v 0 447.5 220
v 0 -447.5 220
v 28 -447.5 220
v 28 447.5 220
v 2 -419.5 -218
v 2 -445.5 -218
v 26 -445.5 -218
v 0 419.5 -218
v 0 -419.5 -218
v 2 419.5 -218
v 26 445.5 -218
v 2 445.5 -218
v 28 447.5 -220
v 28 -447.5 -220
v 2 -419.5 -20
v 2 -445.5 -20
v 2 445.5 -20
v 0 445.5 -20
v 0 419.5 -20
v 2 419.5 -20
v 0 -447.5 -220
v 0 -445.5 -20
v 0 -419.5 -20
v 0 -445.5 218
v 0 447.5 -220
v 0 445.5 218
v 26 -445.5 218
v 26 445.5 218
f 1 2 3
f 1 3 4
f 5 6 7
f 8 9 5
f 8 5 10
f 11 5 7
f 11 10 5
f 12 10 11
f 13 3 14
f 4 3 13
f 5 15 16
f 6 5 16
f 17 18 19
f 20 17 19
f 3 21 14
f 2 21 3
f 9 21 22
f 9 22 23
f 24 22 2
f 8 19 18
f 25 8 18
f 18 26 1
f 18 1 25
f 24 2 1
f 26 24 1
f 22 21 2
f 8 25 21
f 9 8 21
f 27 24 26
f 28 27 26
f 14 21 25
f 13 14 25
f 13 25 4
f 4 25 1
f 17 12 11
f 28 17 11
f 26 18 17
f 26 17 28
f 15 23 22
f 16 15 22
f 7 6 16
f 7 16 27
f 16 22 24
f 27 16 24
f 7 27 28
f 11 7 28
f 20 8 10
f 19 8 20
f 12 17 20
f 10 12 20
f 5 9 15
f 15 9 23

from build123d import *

# Parameters (mm, degrees)
F0_W     = 895
F0_H     = 440
F1_DEPTH = 28
F2_T     = -2
F4_W     = 28
F4_H     = 200
F5_DEPTH = 2


with BuildPart() as f1:
    # F0 (on Right) → F1 (new body)
    with BuildSketch(Plane.YZ):
        Rectangle(F0_W, F0_H)
    extrude(amount=F1_DEPTH)

    # F2
    f2_openings = [f1.faces().sort_by_distance(p)[0] for p in [
        (0, 0, 0),
    ]]
    offset(amount=F2_T, openings=f2_openings)

    # F4 (on face) → F5 (join)
    with BuildSketch(Plane(origin=(0, 0, 0), x_dir=(0, -1, 0), z_dir=(-1, 0, 0))):
        with Locations((-433.5, -120)):
            Rectangle(F4_W, F4_H)
        with Locations((433.5, -120)):
            Rectangle(F4_W, F4_H)
    extrude(amount=-F5_DEPTH)


solid = f1.part
